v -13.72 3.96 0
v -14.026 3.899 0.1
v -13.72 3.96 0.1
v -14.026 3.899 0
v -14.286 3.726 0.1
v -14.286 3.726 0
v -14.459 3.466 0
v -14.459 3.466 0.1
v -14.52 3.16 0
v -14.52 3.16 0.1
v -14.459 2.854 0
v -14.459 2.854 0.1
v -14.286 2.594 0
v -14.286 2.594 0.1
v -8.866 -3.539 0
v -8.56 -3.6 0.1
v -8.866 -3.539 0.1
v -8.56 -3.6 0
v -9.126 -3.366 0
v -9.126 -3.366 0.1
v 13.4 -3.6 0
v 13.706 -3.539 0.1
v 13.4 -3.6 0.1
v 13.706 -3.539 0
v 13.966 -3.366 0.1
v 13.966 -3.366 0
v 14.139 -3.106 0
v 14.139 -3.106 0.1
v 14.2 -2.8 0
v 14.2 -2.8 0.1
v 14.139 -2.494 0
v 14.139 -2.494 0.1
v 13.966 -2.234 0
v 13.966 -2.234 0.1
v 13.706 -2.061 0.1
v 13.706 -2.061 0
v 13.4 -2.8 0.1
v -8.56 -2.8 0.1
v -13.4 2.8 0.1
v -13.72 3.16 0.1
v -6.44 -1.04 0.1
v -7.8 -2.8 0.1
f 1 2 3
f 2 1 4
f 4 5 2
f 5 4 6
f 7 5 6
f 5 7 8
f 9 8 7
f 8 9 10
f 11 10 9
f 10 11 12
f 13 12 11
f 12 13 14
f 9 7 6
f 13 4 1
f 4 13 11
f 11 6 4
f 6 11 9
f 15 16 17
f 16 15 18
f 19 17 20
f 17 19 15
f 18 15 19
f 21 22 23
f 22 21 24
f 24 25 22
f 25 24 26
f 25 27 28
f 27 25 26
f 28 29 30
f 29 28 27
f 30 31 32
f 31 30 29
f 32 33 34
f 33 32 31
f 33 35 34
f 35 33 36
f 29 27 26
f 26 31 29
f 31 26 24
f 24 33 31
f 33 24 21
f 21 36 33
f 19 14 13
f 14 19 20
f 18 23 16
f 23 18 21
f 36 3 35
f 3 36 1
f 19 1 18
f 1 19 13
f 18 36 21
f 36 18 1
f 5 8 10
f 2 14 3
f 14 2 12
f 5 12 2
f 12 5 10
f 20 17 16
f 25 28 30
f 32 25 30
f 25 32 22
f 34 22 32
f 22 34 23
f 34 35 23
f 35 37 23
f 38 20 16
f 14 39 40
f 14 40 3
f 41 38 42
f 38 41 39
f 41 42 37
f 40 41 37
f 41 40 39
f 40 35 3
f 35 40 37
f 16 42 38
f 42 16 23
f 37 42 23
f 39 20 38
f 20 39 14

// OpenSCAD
// file: ../p/7-16cyli.scad
use <../lib.scad>
function ldraw_lib__7_16cyli() = [
// 0 Cylinder 0.4375
// 0 Name: 7-16cyli.dat
// 0 Author: Guy Vivan [guyvivan]
// 0 !LDRAW_ORG Primitive UPDATE 2009-01
// 0 !LICENSE Licensed under CC BY 2.0 and CC BY 4.0 : see CAreadme.txt
// 
// 0 BFC CERTIFY CCW
  [0,"BFC","CERTIFY"],
  [0,"BFC","CCW"],
// 
// 0 !HISTORY 2009-05-02 [PTadmin] Official Update 2009-01
// 
// 
// 4 16 0.9239 0 0.3827 1 0 0 1 1 0 0.9239 1 0.3827
  [4,16,0.9239,0,0.3827,1,0,0,1,1,0,0.9239,1,0.3827],
// 4 16 0.7071 0 0.7071 0.9239 0 0.3827 0.9239 1 0.3827 0.7071 1 0.7071
  [4,16,0.7071,0,0.7071,0.9239,0,0.3827,0.9239,1,0.3827,0.7071,1,0.7071],
// 4 16 0.3827 0 0.9239 0.7071 0 0.7071 0.7071 1 0.7071 0.3827 1 0.9239
  [4,16,0.3827,0,0.9239,0.7071,0,0.7071,0.7071,1,0.7071,0.3827,1,0.9239],
// 4 16 0 0 1 0.3827 0 0.9239 0.3827 1 0.9239 0 1 1
  [4,16,0,0,1,0.3827,0,0.9239,0.3827,1,0.9239,0,1,1],
// 4 16 -0.3827 0 0.9239 0 0 1 0 1 1 -0.3827 1 0.9239
  [4,16,-0.3827,0,0.9239,0,0,1,0,1,1,-0.3827,1,0.9239],
// 4 16 -0.7071 0 0.7071 -0.3827 0 0.9239 -0.3827 1 0.9239 -0.7071 1 0.7071
  [4,16,-0.7071,0,0.7071,-0.3827,0,0.9239,-0.3827,1,0.9239,-0.7071,1,0.7071],
// 4 16 -0.9239 0 0.3827 -0.7071 0 0.7071 -0.7071 1 0.7071 -0.9239 1 0.3827
  [4,16,-0.9239,0,0.3827,-0.7071,0,0.7071,-0.7071,1,0.7071,-0.9239,1,0.3827],
// 
// 0 conditional lines
// 5 24 1 1 0 1 0 0 1 1 -1 0.9239 1 0.3827
  [5,24,1,1,0,1,0,0,1,1,-1,0.9239,1,0.3827],
// 5 24 0.9239 1 0.3827 0.9239 0 0.3827 1 1 0 0.7071 1 0.7071
  [5,24,0.9239,1,0.3827,0.9239,0,0.3827,1,1,0,0.7071,1,0.7071],
// 5 24 0.7071 1 0.7071 0.7071 0 0.7071 0.9239 1 0.3827 0.3827 1 0.9239
  [5,24,0.7071,1,0.7071,0.7071,0,0.7071,0.9239,1,0.3827,0.3827,1,0.9239],
// 5 24 0.3827 1 0.9239 0.3827 0 0.9239 0.7071 1 0.7071 0 1 1
  [5,24,0.3827,1,0.9239,0.3827,0,0.9239,0.7071,1,0.7071,0,1,1],
// 5 24 0 1 1 0 0 1 0.3827 1 0.9239 -0.3827 1 0.9239
  [5,24,0,1,1,0,0,1,0.3827,1,0.9239,-0.3827,1,0.9239],
// 5 24 -0.3827 1 0.9239 -0.3827 0 0.9239 0 1 1 -0.7071 1 0.7071
  [5,24,-0.3827,1,0.9239,-0.3827,0,0.9239,0,1,1,-0.7071,1,0.7071],
// 5 24 -0.7071 1 0.7071 -0.7071 0 0.7071 -0.3827 1 0.9239 -0.9239 1 0.3827
  [5,24,-0.7071,1,0.7071,-0.7071,0,0.7071,-0.3827,1,0.9239,-0.9239,1,0.3827],
// 5 24 -0.9239 1 0.3827 -0.9239 0 0.3827 -1.3066 1 -0.5412 -0.7071 1 0.7071
  [5,24,-0.9239,1,0.3827,-0.9239,0,0.3827,-1.3066,1,-0.5412,-0.7071,1,0.7071],
// 
// 0 end of file
];
module ldraw_lib__7_16cyli(step=0, col=false, unit=2/5, alt=false, line=0.2, solid=!$preview)
    makepoly(ldraw_lib__7_16cyli(), step=step, col=col, unit=unit, alt=alt, line=line, solid=solid);
ldraw_lib__7_16cyli(line=0.2);
// file: ../p/7-16chrd.scad
use <../lib.scad>
function ldraw_lib__7_16chrd() = [
// 0 Chord 0.4375
// 0 Name: 7-16chrd.dat
// 0 Author: Guy Vivan [guyvivan]
// 0 !LDRAW_ORG Primitive UPDATE 2009-03
// 0 !LICENSE Licensed under CC BY 2.0 and CC BY 4.0 : see CAreadme.txt
// 
// 0 BFC CERTIFY CCW
  [0,"BFC","CERTIFY"],
  [0,"BFC","CCW"],
// 
// 0 !HISTORY 2009-12-29 [PTadmin] Official Update 2009-03
// 
// 
// 3 16 0.7071 0 0.7071 0.3827 0 0.9239 0 0 1
  [3,16,0.7071,0,0.7071,0.3827,0,0.9239,0,0,1],
// 4 16 0.7071 0 0.7071 0 0 1 -0.3827 0 0.9239 0.9239 0 0.3827
  [4,16,0.7071,0,0.7071,0,0,1,-0.3827,0,0.9239,0.9239,0,0.3827],
// 4 16 0.9239 0 0.3827 -0.3827 0 0.9239 -0.7071 0 0.7071 1 0 0
  [4,16,0.9239,0,0.3827,-0.3827,0,0.9239,-0.7071,0,0.7071,1,0,0],
// 3 16 -0.7071 0 0.7071 -0.9239 0 0.3827 1 0 0
  [3,16,-0.7071,0,0.7071,-0.9239,0,0.3827,1,0,0],
// 0
];
module ldraw_lib__7_16chrd(step=0, col=false, unit=2/5, alt=false, line=0.2, solid=!$preview)
    makepoly(ldraw_lib__7_16chrd(), step=step, col=col, unit=unit, alt=alt, line=line, solid=solid);
ldraw_lib__7_16chrd(line=0.2);
// file: ../p/3-8cyli.scad
use <../lib.scad>
function ldraw_lib__3_8cyli() = [
// 0 Cylinder 0.375
// 0 Name: 3-8cyli.dat
// 0 Author: James Jessiman
// 0 !LDRAW_ORG Primitive UPDATE 2005-01
// 0 !LICENSE Licensed under CC BY 4.0 : see CAreadme.txt
// 
// 0 BFC CERTIFY CCW
  [0,"BFC","CERTIFY"],
  [0,"BFC","CCW"],
// 
// 0 !HISTORY 2002-05-08 [OrionP] Made BFC compliant
// 0 !HISTORY 2002-08-18 [PTadmin] Official Update 2002-04
// 0 !HISTORY 2004-12-11 [nielsk] Recreated using Primitive Generator, Edge lines fixed, BFC changed to CCW
// 0 !HISTORY 2005-12-28 [PTadmin] Official Update 2005-01
// 0 !HISTORY 2007-06-24 [PTadmin] Header formatted for Contributor Agreement
// 0 !HISTORY 2008-07-01 [PTadmin] Official Update 2008-01
// 
// 
// 4 16 .9239 1 .3827 .9239 0 .3827 1 0 0 1 1 0
  [4,16,.9239,1,.3827,.9239,0,.3827,1,0,0,1,1,0],
// 4 16 .7071 1 .7071 .7071 0 .7071 .9239 0 .3827 .9239 1 .3827
  [4,16,.7071,1,.7071,.7071,0,.7071,.9239,0,.3827,.9239,1,.3827],
// 4 16 .3827 1 .9239 .3827 0 .9239 .7071 0 .7071 .7071 1 .7071
  [4,16,.3827,1,.9239,.3827,0,.9239,.7071,0,.7071,.7071,1,.7071],
// 4 16 0 1 1 0 0 1 .3827 0 .9239 .3827 1 .9239
  [4,16,0,1,1,0,0,1,.3827,0,.9239,.3827,1,.9239],
// 4 16 -.3827 1 .9239 -.3827 0 .9239 0 0 1 0 1 1
  [4,16,-.3827,1,.9239,-.3827,0,.9239,0,0,1,0,1,1],
// 4 16 -.7071 1 .7071 -.7071 0 .7071 -.3827 0 .9239 -.3827 1 .9239
  [4,16,-.7071,1,.7071,-.7071,0,.7071,-.3827,0,.9239,-.3827,1,.9239],
// 5 24 1 1 0 1 0 0 1 1 -.4142 .9239 1 .3827
  [5,24,1,1,0,1,0,0,1,1,-.4142,.9239,1,.3827],
// 5 24 .9239 1 .3827 .9239 0 .3827 1 1 0 .7071 1 .7071
  [5,24,.9239,1,.3827,.9239,0,.3827,1,1,0,.7071,1,.7071],
// 5 24 .7071 1 .7071 .7071 0 .7071 .9239 1 .3827 .3827 1 .9239
  [5,24,.7071,1,.7071,.7071,0,.7071,.9239,1,.3827,.3827,1,.9239],
// 5 24 .3827 1 .9239 .3827 0 .9239 .7071 1 .7071 0 1 1
  [5,24,.3827,1,.9239,.3827,0,.9239,.7071,1,.7071,0,1,1],
// 5 24 0 1 1 0 0 1 .3827 1 .9239 -.3827 1 .9239
  [5,24,0,1,1,0,0,1,.3827,1,.9239,-.3827,1,.9239],
// 5 24 -.3827 1 .9239 -.3827 0 .9239 0 1 1 -.7071 1 .7071
  [5,24,-.3827,1,.9239,-.3827,0,.9239,0,1,1,-.7071,1,.7071],
// 5 24 -.7071 1 .7071 -.7071 0 .7071 -.3827 1 .9239 -1 1 .4142
  [5,24,-.7071,1,.7071,-.7071,0,.7071,-.3827,1,.9239,-1,1,.4142],
// 0
];
module ldraw_lib__3_8cyli(step=0, col=false, unit=2/5, alt=false, line=0.2, solid=!$preview)
    makepoly(ldraw_lib__3_8cyli(), step=step, col=col, unit=unit, alt=alt, line=line, solid=solid);
ldraw_lib__3_8cyli(line=0.2);
// file: ../p/3-8chrd.scad
use <../lib.scad>
function ldraw_lib__3_8chrd() = [
// 0 Chord 0.375
// 0 Name: 3-8chrd.dat
// 0 Author: Donald Sutter [technog]
// 0 !LDRAW_ORG Primitive UPDATE 2005-01
// 0 !LICENSE Licensed under CC BY 4.0 : see CAreadme.txt
// 
// 0 BFC CERTIFY CCW
  [0,"BFC","CERTIFY"],
  [0,"BFC","CCW"],
// 
// 0 !HISTORY 2004-01-07 [Steffen] added primitive code for POVray
// 0 !HISTORY 2004-03-18 [mkennedy] removed pov code and rearanged polygons.
// 0 !HISTORY 2004-09-12 [cwdee] reversed winding and standardised precision
// 0 !HISTORY 2005-12-28 [PTadmin] Official Update 2005-01
// 0 !HISTORY 2007-06-24 [PTadmin] Header formatted for Contributor Agreement
// 0 !HISTORY 2008-07-01 [PTadmin] Official Update 2008-01
// 
// 
// 3 16 0.7071 0 0.7071 0.3827 0 0.9239 0 0 1
  [3,16,0.7071,0,0.7071,0.3827,0,0.9239,0,0,1],
// 4 16 0.9239 0 0.3827 -0.3827 0 0.9239 -0.7071 0 0.7071 1 0 0
  [4,16,0.9239,0,0.3827,-0.3827,0,0.9239,-0.7071,0,0.7071,1,0,0],
// 4 16 0.7071 0 0.7071 0 0 1 -0.3827 0 0.9239 0.9239 0 0.3827
  [4,16,0.7071,0,0.7071,0,0,1,-0.3827,0,0.9239,0.9239,0,0.3827],
// 0
];
module ldraw_lib__3_8chrd(step=0, col=false, unit=2/5, alt=false, line=0.2, solid=!$preview)
    makepoly(ldraw_lib__3_8chrd(), step=step, col=col, unit=unit, alt=alt, line=line, solid=solid);
ldraw_lib__3_8chrd(line=0.2);
// file: ../p/1-8cyli.scad
use <../lib.scad>
function ldraw_lib__1_8cyli() = [
// 0 Cylinder 0.125
// 0 Name: 1-8cyli.dat
// 0 Author: James Jessiman
// 0 !LDRAW_ORG Primitive UPDATE 2005-01
// 0 !LICENSE Licensed under CC BY 4.0 : see CAreadme.txt
// 
// 0 BFC CERTIFY CCW
  [0,"BFC","CERTIFY"],
  [0,"BFC","CCW"],
// 
// 0 !HISTORY 2002-04-25 [PTadmin] Official Update 2002-02
// 0 !HISTORY 2004-12-11 [nielsk] Recreated using Primitive Generator, Edge lines fixed, BFC changed to CCW
// 0 !HISTORY 2005-12-28 [PTadmin] Official Update 2005-01
// 0 !HISTORY 2007-06-22 [PTadmin] Header formatted for Contributor Agreement
// 0 !HISTORY 2008-07-01 [PTadmin] Official Update 2008-01
// 
// 
// 4 16 .9239 1 .3827 .9239 0 .3827 1 0 0 1 1 0
  [4,16,.9239,1,.3827,.9239,0,.3827,1,0,0,1,1,0],
// 4 16 .7071 1 .7071 .7071 0 .7071 .9239 0 .3827 .9239 1 .3827
  [4,16,.7071,1,.7071,.7071,0,.7071,.9239,0,.3827,.9239,1,.3827],
// 5 24 1 1 0 1 0 0 1 1 -.4142 .9239 1 .3827
  [5,24,1,1,0,1,0,0,1,1,-.4142,.9239,1,.3827],
// 5 24 .9239 1 .3827 .9239 0 .3827 1 1 0 .7071 1 .7071
  [5,24,.9239,1,.3827,.9239,0,.3827,1,1,0,.7071,1,.7071],
// 5 24 .7071 1 .7071 .7071 0 .7071 .9239 1 .3827 .4142 1 1
  [5,24,.7071,1,.7071,.7071,0,.7071,.9239,1,.3827,.4142,1,1],
// 0
];
module ldraw_lib__1_8cyli(step=0, col=false, unit=2/5, alt=false, line=0.2, solid=!$preview)
    makepoly(ldraw_lib__1_8cyli(), step=step, col=col, unit=unit, alt=alt, line=line, solid=solid);
ldraw_lib__1_8cyli(line=0.2);
// file: ../p/1-8chrd.scad
use <../lib.scad>
function ldraw_lib__1_8chrd() = [
// 0 Chord 0.125
// 0 Name: 1-8chrd.dat
// 0 Author: Orion Pobursky [OrionP]
// 0 !LDRAW_ORG Primitive UPDATE 2023-05
// 0 !LICENSE Licensed under CC BY 4.0 : see CAreadme.txt
// 
// 0 BFC CERTIFY CCW
  [0,"BFC","CERTIFY"],
  [0,"BFC","CCW"],
// 
// 0 !HISTORY 2004-04-22 [PTadmin] Official Update 2004-02
// 0 !HISTORY 2007-06-22 [PTadmin] Header formatted for Contributor Agreement
// 0 !HISTORY 2008-07-01 [PTadmin] Official Update 2008-01
// 0 !HISTORY 2023-10-27 [OrionP] Rebuilt with PrimGen2, original author westrate
// 0 !HISTORY 2023-10-31 [OrionP] Official Update 2023-05
// 
// 3 16 1 0 0 0.9239 0 0.3827 0.7071 0 0.7071
  [3,16,1,0,0,0.9239,0,0.3827,0.7071,0,0.7071],
];
module ldraw_lib__1_8chrd(step=0, col=false, unit=2/5, alt=false, line=0.2, solid=!$preview)
    makepoly(ldraw_lib__1_8chrd(), step=step, col=col, unit=unit, alt=alt, line=line, solid=solid);
ldraw_lib__1_8chrd(line=0.2);
// main file
use <../lib.scad>
use <../p/1-8chrd.scad>
use <../p/1-8cyli.scad>
use <../p/3-8chrd.scad>
use <../p/3-8cyli.scad>
use <../p/7-16chrd.scad>
use <../p/7-16cyli.scad>
function ldraw_lib__170882a() = [
// 0 Sticker  0.9 x  3.6 Triangle with Black Outline and Red and Blue Filling (Tip Right)
// 0 Name: 170882a.dat
// 0 Author: Gerald Lasser [GeraldLasser]
// 0 !LDRAW_ORG Part UPDATE 2023-06
// 0 !LICENSE Licensed under CC BY 4.0 : see CAreadme.txt
// 
// 0 BFC CERTIFY CCW
  [0,"BFC","CERTIFY"],
  [0,"BFC","CCW"],
// 
// 0 !KEYWORDS Set 4559
// 
// 0 !HISTORY 2023-11-19 [OrionP] Official Update 2023-06
// 
// 
// 0 // Box
// 
// 1 16 -34.3 -.25 7.9 0 0 -2 0 .25 0 2 0 0 3-8cyli.dat
  [1,16,-34.3,-.25,7.9,0,0,-2,0,.25,0,2,0,0, ldraw_lib__3_8cyli()],
// 1 16 -34.3 0 7.9 0 0 -2 0 -1 0 2 0 0 3-8chrd.dat
  [1,16,-34.3,0,7.9,0,0,-2,0,-1,0,2,0,0, ldraw_lib__3_8chrd()],
// 1 16 -21.4 -.25 -7 0 0 -2 0 .25 0 -2 0 0 1-8cyli.dat
  [1,16,-21.4,-.25,-7,0,0,-2,0,.25,0,-2,0,0, ldraw_lib__1_8cyli()],
// 1 16 -21.4 0 -7 0 0 -2 0 -1 0 -2 0 0 1-8chrd.dat
  [1,16,-21.4,0,-7,0,0,-2,0,-1,0,-2,0,0, ldraw_lib__1_8chrd()],
// 1 16 33.5 -.25 -7 0 0 2 0 .25 0 -2 0 0 7-16cyli.dat
  [1,16,33.5,-.25,-7,0,0,2,0,.25,0,-2,0,0, ldraw_lib__7_16cyli()],
// 1 16 33.5 0 -7 0 0 2 0 -1 0 -2 0 0 7-16chrd.dat
  [1,16,33.5,0,-7,0,0,2,0,-1,0,-2,0,0, ldraw_lib__7_16chrd()],
// 4 16 -22.8142 -.25 -8.4142 -35.7142 -.25 6.4858 -35.7142 0 6.4858 -22.8142 0 -8.4142
  [4,16,-22.8142,-.25,-8.4142,-35.7142,-.25,6.4858,-35.7142,0,6.4858,-22.8142,0,-8.4142],
// 4 16 33.5 -.25 -9 -21.4 -.25 -9 -21.4 0 -9 33.5 0 -9
  [4,16,33.5,-.25,-9,-21.4,-.25,-9,-21.4,0,-9,33.5,0,-9],
// 4 16 -34.3 -.25 9.9 34.2654 -.25 -5.1522 34.2654 0 -5.1522 -34.3 0 9.9
  [4,16,-34.3,-.25,9.9,34.2654,-.25,-5.1522,34.2654,0,-5.1522,-34.3,0,9.9],
// 4 16 -22.8142 0 -8.4142 -35.7142 0 6.4858 -34.3 0 9.9 -21.4 0 -9
  [4,16,-22.8142,0,-8.4142,-35.7142,0,6.4858,-34.3,0,9.9,-21.4,0,-9],
// 4 16 33.5 0 -9 -21.4 0 -9 -34.3 0 9.9 34.2654 0 -5.1522
  [4,16,33.5,0,-9,-21.4,0,-9,-34.3,0,9.9,34.2654,0,-5.1522],
// 5 24 -22.8142 0 -8.4142 -22.8142 -.25 -8.4142 -22.1654 0 -8.8478 -35.7142 0 6.4858
  [5,24,-22.8142,0,-8.4142,-22.8142,-.25,-8.4142,-22.1654,0,-8.8478,-35.7142,0,6.4858],
// 5 24 -35.7142 0 6.4858 -35.7142 -.25 6.4858 -36.1478 0 7.1346 -22.8142 0 -8.4142
  [5,24,-35.7142,0,6.4858,-35.7142,-.25,6.4858,-36.1478,0,7.1346,-22.8142,0,-8.4142],
// 5 24 -34.3 -.25 9.9 -34.3 0 9.9 -35.0654 0 9.7478 34.2654 0 -5.1522
  [5,24,-34.3,-.25,9.9,-34.3,0,9.9,-35.0654,0,9.7478,34.2654,0,-5.1522],
// 5 24 34.2654 -.25 -5.1522 34.2654 0 -5.1522 34.9142 0 -5.5858 -34.3 0 9.9
  [5,24,34.2654,-.25,-5.1522,34.2654,0,-5.1522,34.9142,0,-5.5858,-34.3,0,9.9],
// 
// 1 0 -34.3 -.25 7.9 0 0 -2 0 1 0 2 0 0 3-8chrd.dat
  [1,0,-34.3,-.25,7.9,0,0,-2,0,1,0,2,0,0, ldraw_lib__3_8chrd()],
// 1 0 -21.4 -.25 -7 0 0 -2 0 1 0 -2 0 0 1-8chrd.dat
  [1,0,-21.4,-.25,-7,0,0,-2,0,1,0,-2,0,0, ldraw_lib__1_8chrd()],
// 1 0 33.5 -0.25 -7 0 0 2 0 1 0 -2 0 0 7-16chrd.dat
  [1,0,33.5,-0.25,-7,0,0,2,0,1,0,-2,0,0, ldraw_lib__7_16chrd()],
// 3 0 34.2654 -.25 -5.1522 33.5 -.25 -7 33.5 -.25 -9
  [3,0,34.2654,-.25,-5.1522,33.5,-.25,-7,33.5,-.25,-9],
// 3 0 -21.4 -.25 -7 -22.8142 -.25 -8.4142 -21.4 -.25 -9
  [3,0,-21.4,-.25,-7,-22.8142,-.25,-8.4142,-21.4,-.25,-9],
// 3 0 -35.7142 -.25 6.4858 -33.5 -.25 7 -34.3 -.25 7.9
  [3,0,-35.7142,-.25,6.4858,-33.5,-.25,7,-34.3,-.25,7.9],
// 3 0 -35.7142 -.25 6.4858 -34.3 -.25 7.9 -34.3 -.25 9.9
  [3,0,-35.7142,-.25,6.4858,-34.3,-.25,7.9,-34.3,-.25,9.9],
// 4 1 -16.1 -0.25 -2.6 -33.5 -0.25 7 -21.4 -0.25 -7 -19.5 -0.25 -7
  [4,1,-16.1,-0.25,-2.6,-33.5,-0.25,7,-21.4,-0.25,-7,-19.5,-0.25,-7],
// 3 4 -16.1 -0.25 -2.6 -19.5 -0.25 -7 33.5 -0.25 -7
  [3,4,-16.1,-0.25,-2.6,-19.5,-0.25,-7,33.5,-0.25,-7],
// 4 4 -33.5 -0.25 7 -16.1 -0.25 -2.6 33.5 -0.25 -7 -34.3 -0.25 7.9
  [4,4,-33.5,-0.25,7,-16.1,-0.25,-2.6,33.5,-0.25,-7,-34.3,-0.25,7.9],
// 4 0 -34.3 -.25 7.9 33.5 -.25 -7 34.2654 -.25 -5.1522 -34.3 -.25 9.9
  [4,0,-34.3,-.25,7.9,33.5,-.25,-7,34.2654,-.25,-5.1522,-34.3,-.25,9.9],
// 4 0 -19.5 -.25 -7 -21.4 -.25 -7 -21.4 -.25 -9 33.5 -.25 -9
  [4,0,-19.5,-.25,-7,-21.4,-.25,-7,-21.4,-.25,-9,33.5,-.25,-9],
// 3 0 33.5 -0.25 -7 -19.5 -0.25 -7 33.5 -0.25 -9
  [3,0,33.5,-0.25,-7,-19.5,-0.25,-7,33.5,-0.25,-9],
// 4 0 -33.5 -.25 7 -35.7142 -.25 6.4858 -22.8142 -.25 -8.4142 -21.4 -.25 -7
  [4,0,-33.5,-.25,7,-35.7142,-.25,6.4858,-22.8142,-.25,-8.4142,-21.4,-.25,-7],
];
module ldraw_lib__170882a(step=0, col=false, unit=2/5, alt=false, line=0.2, solid=!$preview)
    makepoly(ldraw_lib__170882a(), step=step, col=col, unit=unit, alt=alt, line=line, solid=solid);
ldraw_lib__170882a(line=0.2);
